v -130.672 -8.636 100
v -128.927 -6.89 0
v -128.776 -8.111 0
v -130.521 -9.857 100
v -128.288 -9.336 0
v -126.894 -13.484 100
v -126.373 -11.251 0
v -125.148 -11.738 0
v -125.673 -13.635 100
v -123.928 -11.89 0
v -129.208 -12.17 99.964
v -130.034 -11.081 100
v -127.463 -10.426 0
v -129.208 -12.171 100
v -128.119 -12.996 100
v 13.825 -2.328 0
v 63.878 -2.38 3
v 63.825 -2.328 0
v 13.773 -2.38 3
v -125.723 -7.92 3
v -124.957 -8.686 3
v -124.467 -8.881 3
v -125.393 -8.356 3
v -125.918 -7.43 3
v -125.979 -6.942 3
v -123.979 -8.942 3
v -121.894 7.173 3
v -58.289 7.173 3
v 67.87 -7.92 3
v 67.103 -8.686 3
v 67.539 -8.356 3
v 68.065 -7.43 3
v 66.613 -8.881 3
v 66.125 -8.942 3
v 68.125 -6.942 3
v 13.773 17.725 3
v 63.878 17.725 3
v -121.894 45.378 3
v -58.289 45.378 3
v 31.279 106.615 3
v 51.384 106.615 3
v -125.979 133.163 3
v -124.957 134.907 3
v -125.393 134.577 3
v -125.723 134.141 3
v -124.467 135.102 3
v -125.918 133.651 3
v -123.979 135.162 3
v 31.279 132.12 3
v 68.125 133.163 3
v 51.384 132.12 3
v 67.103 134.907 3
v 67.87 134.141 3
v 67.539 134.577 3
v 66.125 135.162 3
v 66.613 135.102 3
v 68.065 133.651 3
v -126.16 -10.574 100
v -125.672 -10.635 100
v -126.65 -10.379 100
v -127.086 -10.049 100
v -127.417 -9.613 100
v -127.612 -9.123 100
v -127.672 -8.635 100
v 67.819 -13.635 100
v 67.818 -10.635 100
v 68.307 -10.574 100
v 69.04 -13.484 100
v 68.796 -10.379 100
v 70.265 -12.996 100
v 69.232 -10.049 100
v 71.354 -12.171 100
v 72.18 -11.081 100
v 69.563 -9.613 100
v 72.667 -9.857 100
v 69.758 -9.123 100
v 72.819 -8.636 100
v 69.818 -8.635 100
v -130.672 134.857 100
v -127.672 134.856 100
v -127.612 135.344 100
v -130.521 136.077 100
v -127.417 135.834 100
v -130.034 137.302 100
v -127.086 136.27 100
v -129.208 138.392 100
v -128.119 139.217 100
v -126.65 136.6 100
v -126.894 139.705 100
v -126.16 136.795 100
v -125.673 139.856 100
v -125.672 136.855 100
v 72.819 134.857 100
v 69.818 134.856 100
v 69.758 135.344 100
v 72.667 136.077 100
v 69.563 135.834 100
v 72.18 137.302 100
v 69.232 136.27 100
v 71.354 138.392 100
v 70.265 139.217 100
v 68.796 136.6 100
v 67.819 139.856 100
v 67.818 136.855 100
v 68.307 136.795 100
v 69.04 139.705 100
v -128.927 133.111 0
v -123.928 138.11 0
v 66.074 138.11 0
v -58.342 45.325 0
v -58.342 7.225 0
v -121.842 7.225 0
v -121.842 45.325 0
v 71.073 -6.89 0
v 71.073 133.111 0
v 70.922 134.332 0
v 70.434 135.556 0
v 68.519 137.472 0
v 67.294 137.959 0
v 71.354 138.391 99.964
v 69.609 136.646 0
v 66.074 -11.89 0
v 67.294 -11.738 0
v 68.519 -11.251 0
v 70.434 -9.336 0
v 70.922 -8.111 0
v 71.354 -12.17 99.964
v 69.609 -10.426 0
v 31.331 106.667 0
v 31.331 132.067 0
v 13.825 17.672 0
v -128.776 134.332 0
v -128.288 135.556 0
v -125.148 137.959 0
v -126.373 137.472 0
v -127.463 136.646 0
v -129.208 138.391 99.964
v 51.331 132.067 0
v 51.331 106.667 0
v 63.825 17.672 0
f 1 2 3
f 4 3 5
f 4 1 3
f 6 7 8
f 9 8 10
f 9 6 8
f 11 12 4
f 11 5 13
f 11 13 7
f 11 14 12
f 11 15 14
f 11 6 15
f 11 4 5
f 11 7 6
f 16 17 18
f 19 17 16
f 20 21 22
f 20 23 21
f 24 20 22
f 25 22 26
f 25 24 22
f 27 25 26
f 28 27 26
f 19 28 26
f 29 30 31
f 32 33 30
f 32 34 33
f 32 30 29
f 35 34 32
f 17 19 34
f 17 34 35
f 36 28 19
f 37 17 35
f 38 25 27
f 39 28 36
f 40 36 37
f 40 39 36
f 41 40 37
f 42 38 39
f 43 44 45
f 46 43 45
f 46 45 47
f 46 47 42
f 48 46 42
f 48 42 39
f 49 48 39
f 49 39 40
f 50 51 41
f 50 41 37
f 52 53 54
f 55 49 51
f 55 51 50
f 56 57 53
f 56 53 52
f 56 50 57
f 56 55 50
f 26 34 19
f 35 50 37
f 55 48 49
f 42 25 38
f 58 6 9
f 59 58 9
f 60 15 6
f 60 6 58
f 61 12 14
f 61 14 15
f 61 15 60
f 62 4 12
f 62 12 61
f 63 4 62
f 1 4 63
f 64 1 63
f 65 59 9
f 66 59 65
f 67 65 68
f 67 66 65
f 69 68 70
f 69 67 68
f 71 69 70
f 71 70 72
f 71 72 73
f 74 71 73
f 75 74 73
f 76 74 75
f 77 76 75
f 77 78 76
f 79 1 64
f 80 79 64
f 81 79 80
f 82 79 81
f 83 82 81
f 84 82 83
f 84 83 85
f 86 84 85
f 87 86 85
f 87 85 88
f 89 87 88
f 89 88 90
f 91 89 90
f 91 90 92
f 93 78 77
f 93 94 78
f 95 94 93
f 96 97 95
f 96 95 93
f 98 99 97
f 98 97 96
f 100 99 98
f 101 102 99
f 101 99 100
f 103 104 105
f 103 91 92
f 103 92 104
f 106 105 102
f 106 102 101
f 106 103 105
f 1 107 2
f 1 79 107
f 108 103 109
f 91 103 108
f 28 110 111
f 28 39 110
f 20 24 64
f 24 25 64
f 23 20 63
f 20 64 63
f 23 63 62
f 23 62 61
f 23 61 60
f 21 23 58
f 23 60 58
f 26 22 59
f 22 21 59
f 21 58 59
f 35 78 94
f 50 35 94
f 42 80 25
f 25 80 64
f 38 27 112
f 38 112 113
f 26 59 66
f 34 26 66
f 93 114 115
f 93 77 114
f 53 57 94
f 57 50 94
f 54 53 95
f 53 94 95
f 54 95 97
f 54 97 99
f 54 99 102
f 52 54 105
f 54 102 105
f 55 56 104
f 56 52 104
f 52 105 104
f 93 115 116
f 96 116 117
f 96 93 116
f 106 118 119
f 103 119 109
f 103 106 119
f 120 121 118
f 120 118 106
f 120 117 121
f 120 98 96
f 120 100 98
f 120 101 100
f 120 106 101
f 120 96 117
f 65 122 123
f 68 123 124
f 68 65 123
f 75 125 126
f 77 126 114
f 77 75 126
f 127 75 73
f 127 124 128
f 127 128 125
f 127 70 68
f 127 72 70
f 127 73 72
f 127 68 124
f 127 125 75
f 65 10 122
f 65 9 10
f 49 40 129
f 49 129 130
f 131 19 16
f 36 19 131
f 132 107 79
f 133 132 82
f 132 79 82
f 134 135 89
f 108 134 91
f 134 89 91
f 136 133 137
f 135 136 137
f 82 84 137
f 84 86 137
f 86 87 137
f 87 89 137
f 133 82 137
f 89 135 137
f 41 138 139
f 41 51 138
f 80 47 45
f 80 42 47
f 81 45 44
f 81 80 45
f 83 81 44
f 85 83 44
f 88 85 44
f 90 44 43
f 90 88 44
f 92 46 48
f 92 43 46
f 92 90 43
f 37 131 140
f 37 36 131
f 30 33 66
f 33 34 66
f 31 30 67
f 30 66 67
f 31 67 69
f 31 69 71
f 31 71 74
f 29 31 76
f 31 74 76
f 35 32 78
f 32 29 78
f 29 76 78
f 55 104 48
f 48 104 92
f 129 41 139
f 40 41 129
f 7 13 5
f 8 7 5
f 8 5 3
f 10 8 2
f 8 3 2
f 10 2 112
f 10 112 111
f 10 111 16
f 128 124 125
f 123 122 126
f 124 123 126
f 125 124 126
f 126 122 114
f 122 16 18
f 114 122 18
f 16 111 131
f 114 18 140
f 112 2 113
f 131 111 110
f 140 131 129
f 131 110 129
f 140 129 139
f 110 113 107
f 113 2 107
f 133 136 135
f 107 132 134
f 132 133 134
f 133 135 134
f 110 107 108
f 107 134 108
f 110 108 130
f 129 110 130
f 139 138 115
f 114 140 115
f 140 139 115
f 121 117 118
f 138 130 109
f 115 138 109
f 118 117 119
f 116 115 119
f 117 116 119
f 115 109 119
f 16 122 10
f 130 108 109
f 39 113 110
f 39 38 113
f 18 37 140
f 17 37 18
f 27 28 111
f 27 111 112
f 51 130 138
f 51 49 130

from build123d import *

# Parameters (mm, degrees)
SKETCH3_W           = 200
SKETCH3_H           = 150
BOSS_EXTRUDE1_DEPTH = 100
BOSS_EXTRUDE1_TAPER = -1
FILLET1_R           = 5
SHELL1_T            = -3
SKETCH10_W          = 20
SKETCH10_H          = 25.4
SKETCH10_W_2        = 50
SKETCH10_H_2        = 20
CUT_EXTRUDE6_DEPTH  = 59.614
CUT_EXTRUDE6_TAPER  = -1
SKETCH12_W          = 63.5
SKETCH12_H          = 38.1
CUT_EXTRUDE7_DEPTH  = 100
CUT_EXTRUDE7_TAPER  = -1


with BuildPart() as part:
    # Sketch3 → Boss-Extrude1 (new body)
    with BuildSketch(Plane.XY):
        with Locations((-28.926930074, 63.110328622)):
            Rectangle(SKETCH3_W, SKETCH3_H)
    extrude(amount=BOSS_EXTRUDE1_DEPTH, taper=BOSS_EXTRUDE1_TAPER)

    # Fillet1
    fillet1_edges = [part.edges().sort_by_distance(p)[0] for p in [
        (71.945823172, -12.762424624, 50),
        (-129.799683321, -12.762424624, 50),
        (-129.799683321, 138.983081869, 50),
        (71.945823172, 138.983081869, 50),
    ]]
    fillet(fillet1_edges, radius=FILLET1_R)

    # Shell1
    shell1_openings = [part.faces().sort_by_distance(p)[0] for p in [
        (-28.926930074, 63.110328622, 100),
    ]]
    offset(amount=SHELL1_T, openings=shell1_openings, kind=Kind.INTERSECTION)

    # Sketch10 → Cut-Extrude6 (cut)
    with BuildSketch(Plane(origin=(0, 0, 0), x_dir=(-1, 0, 0), z_dir=(0, 0, -1))):
        with Locations((-41.331432063, 119.367467356)):
            Rectangle(SKETCH10_W, SKETCH10_H)
        with Locations((-38.825178327, 7.672208688)):
            Rectangle(SKETCH10_W_2, SKETCH10_H_2)
    extrude(amount=-CUT_EXTRUDE6_DEPTH, taper=CUT_EXTRUDE6_TAPER, mode=Mode.SUBTRACT)

    # Sketch12 → Cut-Extrude7 (cut)
    with BuildSketch(Plane(origin=(0, 0, 0), x_dir=(-1, 0, 0), z_dir=(0, 0, -1))):
        with Locations((90.091836521, 26.275420471)):
            Rectangle(SKETCH12_W, SKETCH12_H)
    extrude(amount=-CUT_EXTRUDE7_DEPTH, taper=CUT_EXTRUDE7_TAPER, mode=Mode.SUBTRACT)


solid = part.part
